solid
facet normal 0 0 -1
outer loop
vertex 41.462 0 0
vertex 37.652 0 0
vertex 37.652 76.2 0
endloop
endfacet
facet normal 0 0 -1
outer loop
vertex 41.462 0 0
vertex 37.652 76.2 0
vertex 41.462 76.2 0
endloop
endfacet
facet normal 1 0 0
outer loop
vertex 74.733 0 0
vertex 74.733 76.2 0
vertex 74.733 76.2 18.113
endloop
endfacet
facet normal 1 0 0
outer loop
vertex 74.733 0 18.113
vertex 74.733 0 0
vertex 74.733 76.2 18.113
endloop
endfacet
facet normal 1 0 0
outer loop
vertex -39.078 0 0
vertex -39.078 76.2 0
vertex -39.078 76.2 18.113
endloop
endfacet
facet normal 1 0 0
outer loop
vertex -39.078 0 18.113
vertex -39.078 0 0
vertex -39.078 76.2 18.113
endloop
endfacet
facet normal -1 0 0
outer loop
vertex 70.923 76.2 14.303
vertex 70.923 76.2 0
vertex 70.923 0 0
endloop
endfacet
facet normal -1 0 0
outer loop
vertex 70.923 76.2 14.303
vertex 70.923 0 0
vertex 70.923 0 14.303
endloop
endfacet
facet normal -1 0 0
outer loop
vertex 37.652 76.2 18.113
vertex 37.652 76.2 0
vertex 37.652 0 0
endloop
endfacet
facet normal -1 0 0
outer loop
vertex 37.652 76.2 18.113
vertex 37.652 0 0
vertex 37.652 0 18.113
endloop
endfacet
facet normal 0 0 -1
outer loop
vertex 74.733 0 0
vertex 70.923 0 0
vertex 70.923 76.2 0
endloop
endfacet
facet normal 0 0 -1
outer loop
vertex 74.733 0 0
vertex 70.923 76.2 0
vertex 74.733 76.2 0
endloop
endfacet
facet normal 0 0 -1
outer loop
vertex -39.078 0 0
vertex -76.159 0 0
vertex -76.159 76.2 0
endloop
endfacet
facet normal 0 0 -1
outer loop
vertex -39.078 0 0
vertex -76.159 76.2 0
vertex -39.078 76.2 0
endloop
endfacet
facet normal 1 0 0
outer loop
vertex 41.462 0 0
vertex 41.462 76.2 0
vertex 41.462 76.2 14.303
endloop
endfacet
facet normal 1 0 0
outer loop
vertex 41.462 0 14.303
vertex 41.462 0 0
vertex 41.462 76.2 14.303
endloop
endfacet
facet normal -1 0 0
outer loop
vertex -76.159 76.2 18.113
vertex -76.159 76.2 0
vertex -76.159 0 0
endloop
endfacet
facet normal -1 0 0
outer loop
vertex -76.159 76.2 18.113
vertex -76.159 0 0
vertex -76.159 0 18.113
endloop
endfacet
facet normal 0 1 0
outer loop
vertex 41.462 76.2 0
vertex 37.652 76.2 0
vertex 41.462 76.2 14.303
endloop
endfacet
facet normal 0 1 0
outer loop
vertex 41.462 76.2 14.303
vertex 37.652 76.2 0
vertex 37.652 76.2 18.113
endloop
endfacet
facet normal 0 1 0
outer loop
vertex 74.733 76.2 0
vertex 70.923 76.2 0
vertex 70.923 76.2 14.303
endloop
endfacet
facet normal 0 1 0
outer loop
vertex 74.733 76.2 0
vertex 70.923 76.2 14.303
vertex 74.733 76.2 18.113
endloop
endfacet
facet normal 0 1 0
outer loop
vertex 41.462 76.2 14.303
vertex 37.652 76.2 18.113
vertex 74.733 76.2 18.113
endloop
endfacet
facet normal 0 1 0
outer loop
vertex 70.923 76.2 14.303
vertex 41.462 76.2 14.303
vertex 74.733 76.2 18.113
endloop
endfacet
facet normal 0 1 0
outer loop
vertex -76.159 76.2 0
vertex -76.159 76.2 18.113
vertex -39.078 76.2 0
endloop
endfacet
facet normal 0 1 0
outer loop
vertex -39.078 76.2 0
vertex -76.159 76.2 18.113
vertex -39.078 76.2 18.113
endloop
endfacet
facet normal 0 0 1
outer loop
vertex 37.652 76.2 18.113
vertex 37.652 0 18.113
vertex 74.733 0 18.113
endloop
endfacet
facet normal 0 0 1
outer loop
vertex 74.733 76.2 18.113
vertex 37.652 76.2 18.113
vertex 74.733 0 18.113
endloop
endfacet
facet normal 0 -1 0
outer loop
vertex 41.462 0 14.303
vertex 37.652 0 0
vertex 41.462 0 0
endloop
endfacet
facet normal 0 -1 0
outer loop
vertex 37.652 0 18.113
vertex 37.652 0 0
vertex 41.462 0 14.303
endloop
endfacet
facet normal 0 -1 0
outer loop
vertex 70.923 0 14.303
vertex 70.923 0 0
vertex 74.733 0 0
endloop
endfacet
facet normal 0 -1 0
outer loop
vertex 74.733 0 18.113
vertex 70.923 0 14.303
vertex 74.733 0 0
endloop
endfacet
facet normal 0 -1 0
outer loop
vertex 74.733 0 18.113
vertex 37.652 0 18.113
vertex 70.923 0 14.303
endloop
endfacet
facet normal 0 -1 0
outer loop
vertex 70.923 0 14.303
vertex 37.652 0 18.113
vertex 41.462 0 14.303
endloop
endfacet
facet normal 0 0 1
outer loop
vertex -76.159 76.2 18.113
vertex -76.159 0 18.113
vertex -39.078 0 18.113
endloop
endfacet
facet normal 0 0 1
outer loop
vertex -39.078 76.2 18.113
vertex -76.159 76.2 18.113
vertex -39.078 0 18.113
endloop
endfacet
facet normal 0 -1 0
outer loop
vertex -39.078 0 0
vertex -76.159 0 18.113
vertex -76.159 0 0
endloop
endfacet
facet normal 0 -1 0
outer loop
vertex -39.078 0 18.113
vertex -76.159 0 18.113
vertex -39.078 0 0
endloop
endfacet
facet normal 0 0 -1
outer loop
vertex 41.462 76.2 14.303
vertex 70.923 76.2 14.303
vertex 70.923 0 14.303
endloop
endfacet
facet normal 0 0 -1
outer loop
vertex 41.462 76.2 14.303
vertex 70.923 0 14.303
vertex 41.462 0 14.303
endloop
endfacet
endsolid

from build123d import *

# Parameters (mm, degrees)
F0_W     = 37.0812825859
F0_H     = 18.1127805263
F1_DEPTH = 76.2
F0_W_2   = 37.0812863111
F2_DEPTH = 76.2
F3_W     = 29.4612825859
F3_H     = 14.3027805263
F4_DEPTH = 152.4


with BuildPart() as f1:
    # F0 (on Front) → F1 (new body)
    with BuildSketch(Plane.XZ):
        with Locations((56.1924073845, 9.0563902631)):
            Rectangle(F0_W, F0_H)
    extrude(amount=F1_DEPTH)


with BuildPart() as f1b:
    # F0 (on Front) → F1, piece 2 (new body)
    with BuildSketch(Plane.XZ):
        with Locations((-57.6186105609, 9.0563902631)):
            Rectangle(F0_W_2, F0_H)
    extrude(amount=F1_DEPTH)


with BuildPart() as f2:
    # F0 (on Front) → F2 (new body)
    with BuildSketch(Plane.XZ):
        with Locations((56.1924073845, 9.0563902631)):
            Rectangle(F0_W, F0_H)
    extrude(amount=-F2_DEPTH)


with BuildPart() as f2b:
    # F0 (on Front) → F2, piece 2 (new body)
    with BuildSketch(Plane.XZ):
        with Locations((-57.6186105609, 9.0563902631)):
            Rectangle(F0_W_2, F0_H)
    extrude(amount=-F2_DEPTH)


with BuildPart() as f4_tool:
    # F3 (on face) + F0 (on Front) → F4 (new body)
    with BuildSketch(Plane(origin=(0, 76.2, 0), x_dir=(-1, 0, 0), z_dir=(0, 1, 0))):
        with Locations((-56.1924073845, 7.1513902631)):
            Rectangle(F3_W, F3_H)
    with BuildSketch(Plane.XZ):
        with Locations((-57.6186105609, 9.0563902631)):
            Rectangle(F0_W_2, F0_H)
        with Locations((56.1924073845, 9.0563902631)):
            Rectangle(F0_W, F0_H)
    extrude(amount=-F4_DEPTH, dir=(0, 1, 0))


with BuildPart() as f1_1:
    add(f1.part)

    # F4: cut by f4_tool
    add(f4_tool.part, mode=Mode.SUBTRACT)


with BuildPart() as f1b_1:
    add(f1b.part)

    # F4: cut by f4_tool
    add(f4_tool.part, mode=Mode.SUBTRACT)


with BuildPart() as f2_1:
    add(f2.part)

    # F4: cut by f4_tool
    add(f4_tool.part, mode=Mode.SUBTRACT)


solid = Compound([f2b.part, f2_1.part])
